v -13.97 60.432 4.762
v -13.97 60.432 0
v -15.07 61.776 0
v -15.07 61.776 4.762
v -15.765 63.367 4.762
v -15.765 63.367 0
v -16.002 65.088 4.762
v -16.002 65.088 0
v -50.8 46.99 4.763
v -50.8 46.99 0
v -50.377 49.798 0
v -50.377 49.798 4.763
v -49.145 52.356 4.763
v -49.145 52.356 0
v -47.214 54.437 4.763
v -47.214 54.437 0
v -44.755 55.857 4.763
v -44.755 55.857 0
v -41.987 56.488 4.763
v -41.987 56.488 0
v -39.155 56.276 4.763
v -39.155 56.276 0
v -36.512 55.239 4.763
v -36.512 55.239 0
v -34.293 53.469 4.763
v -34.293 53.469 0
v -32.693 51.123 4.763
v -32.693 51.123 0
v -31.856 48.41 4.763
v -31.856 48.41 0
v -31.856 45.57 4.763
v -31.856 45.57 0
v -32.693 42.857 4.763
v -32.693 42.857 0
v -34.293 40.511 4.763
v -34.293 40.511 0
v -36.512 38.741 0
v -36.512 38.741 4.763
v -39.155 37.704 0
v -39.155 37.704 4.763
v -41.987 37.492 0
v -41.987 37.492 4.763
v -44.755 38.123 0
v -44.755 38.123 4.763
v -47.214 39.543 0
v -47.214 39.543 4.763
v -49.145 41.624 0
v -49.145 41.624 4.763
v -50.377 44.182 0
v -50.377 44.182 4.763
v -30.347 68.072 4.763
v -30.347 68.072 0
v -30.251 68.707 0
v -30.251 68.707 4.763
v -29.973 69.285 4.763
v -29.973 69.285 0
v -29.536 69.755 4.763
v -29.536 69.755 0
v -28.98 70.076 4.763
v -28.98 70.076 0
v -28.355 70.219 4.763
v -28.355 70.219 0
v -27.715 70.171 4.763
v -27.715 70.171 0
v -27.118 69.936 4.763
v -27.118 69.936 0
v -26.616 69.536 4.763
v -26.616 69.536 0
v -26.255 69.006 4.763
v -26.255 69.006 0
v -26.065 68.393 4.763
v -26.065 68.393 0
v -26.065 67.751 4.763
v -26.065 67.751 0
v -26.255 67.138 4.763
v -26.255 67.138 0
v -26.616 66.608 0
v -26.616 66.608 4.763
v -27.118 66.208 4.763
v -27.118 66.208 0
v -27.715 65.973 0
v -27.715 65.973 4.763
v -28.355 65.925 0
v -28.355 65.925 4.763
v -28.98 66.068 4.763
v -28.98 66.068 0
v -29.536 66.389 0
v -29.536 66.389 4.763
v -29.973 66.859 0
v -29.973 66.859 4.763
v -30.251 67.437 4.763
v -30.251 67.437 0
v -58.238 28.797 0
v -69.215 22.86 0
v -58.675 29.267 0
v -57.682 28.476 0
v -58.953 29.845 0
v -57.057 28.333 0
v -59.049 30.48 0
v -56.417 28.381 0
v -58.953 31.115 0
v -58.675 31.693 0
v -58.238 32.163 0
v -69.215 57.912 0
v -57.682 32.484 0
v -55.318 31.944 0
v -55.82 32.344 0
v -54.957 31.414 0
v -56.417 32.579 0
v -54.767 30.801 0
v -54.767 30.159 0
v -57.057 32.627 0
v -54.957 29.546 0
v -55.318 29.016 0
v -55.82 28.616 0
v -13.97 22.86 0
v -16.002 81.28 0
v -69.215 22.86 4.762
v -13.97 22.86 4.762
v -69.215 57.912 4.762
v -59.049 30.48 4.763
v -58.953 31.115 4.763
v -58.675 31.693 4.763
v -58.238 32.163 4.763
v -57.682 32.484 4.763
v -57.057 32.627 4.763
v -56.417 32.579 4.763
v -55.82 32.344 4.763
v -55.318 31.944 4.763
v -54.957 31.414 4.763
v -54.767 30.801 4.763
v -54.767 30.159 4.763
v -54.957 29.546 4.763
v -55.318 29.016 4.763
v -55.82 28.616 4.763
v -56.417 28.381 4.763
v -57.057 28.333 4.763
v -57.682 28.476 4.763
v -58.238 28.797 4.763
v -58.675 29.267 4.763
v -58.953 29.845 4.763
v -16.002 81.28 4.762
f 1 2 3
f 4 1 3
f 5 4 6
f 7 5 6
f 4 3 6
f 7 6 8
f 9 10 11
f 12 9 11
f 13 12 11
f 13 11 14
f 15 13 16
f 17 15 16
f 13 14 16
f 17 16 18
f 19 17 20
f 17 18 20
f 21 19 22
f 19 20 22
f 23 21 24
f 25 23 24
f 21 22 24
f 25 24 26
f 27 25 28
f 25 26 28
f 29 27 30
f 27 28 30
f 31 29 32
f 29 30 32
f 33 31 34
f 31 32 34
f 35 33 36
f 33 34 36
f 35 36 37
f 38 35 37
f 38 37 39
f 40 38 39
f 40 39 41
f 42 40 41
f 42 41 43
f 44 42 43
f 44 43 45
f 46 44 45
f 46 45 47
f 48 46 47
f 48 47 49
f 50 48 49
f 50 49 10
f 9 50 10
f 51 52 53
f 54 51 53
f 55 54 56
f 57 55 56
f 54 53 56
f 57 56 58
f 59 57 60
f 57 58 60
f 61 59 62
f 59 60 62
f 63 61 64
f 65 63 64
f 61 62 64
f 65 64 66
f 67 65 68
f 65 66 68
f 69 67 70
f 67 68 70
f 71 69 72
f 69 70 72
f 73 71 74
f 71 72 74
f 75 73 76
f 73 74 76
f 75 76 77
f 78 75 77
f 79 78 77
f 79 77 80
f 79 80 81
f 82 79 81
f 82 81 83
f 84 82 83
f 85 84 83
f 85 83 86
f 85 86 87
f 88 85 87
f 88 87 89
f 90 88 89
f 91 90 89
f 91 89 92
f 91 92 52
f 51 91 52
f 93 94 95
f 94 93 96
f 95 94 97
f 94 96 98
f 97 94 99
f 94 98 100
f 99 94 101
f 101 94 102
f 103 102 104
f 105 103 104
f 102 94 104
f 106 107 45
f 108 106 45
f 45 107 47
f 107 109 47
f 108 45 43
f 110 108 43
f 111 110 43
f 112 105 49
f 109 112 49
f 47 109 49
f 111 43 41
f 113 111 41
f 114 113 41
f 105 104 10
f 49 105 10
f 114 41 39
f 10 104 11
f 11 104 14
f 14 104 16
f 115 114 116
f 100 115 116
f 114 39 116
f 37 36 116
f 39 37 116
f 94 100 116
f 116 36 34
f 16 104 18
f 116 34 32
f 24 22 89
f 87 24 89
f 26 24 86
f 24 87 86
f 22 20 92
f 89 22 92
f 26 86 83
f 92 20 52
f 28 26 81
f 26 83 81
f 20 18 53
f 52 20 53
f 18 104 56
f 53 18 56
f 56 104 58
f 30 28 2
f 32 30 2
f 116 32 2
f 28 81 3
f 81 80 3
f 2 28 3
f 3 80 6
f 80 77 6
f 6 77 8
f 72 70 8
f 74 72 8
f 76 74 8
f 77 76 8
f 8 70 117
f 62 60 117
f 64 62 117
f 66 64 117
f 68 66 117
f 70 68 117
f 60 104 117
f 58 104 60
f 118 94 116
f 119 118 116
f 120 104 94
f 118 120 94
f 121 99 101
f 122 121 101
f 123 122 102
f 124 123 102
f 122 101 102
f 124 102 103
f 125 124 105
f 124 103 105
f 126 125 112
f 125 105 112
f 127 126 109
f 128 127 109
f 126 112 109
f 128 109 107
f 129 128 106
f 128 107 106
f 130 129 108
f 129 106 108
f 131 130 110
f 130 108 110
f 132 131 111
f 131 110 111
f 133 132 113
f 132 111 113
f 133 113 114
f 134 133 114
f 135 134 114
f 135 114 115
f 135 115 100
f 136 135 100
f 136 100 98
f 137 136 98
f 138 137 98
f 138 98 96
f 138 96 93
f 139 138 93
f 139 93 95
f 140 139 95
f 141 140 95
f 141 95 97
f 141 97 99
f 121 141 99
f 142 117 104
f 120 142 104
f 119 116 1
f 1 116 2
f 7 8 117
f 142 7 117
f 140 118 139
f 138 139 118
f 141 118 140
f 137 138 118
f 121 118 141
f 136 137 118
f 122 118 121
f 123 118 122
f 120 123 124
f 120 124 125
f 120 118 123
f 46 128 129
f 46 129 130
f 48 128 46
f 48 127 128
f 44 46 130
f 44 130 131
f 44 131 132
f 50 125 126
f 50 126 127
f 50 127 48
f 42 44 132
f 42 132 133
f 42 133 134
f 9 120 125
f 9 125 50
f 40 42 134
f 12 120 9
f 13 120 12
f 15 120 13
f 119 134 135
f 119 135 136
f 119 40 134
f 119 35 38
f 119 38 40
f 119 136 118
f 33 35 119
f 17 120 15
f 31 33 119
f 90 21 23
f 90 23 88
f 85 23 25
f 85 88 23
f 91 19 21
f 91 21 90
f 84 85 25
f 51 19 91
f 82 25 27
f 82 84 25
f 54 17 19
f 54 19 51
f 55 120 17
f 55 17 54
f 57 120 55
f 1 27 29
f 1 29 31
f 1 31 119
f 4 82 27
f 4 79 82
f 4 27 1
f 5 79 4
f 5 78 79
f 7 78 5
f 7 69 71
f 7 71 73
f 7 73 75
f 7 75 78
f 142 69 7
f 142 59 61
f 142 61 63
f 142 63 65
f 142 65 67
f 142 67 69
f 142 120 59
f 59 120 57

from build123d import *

# Parameters (mm, degrees)
BOSS_EXTRUDE1_DEPTH         = 4.7625
F_3_4_0_75_DIAMETER_HOLE1_D = 19.05
F_6_CLEARANCE_HOLE1_D       = 4.3053


with BuildPart() as part:
    # Sketch1 → Boss-Extrude1 (new body)
    with BuildSketch(Plane.XY):
        with BuildLine():
            Line((-13.97, 22.86), (-13.97, 60.431603094))
            ThreePointArc((-13.97, 60.431603094), (-15.471871133, 62.5475), (-16.002, 65.0875))
            Line((-16.002, 65.0875), (-16.002, 81.28))
            Line((-16.002, 81.28), (-69.215, 57.912))
            Line((-69.215, 57.912), (-69.215, 22.86))
            Line((-69.215, 22.86), (-13.97, 22.86))
        make_face()
    extrude(amount=BOSS_EXTRUDE1_DEPTH)

    # 3/4 (0.75) Diameter Hole1 (through all)
    with Locations(Plane.XY.offset(4.7625)):
        with Locations((-41.275, 46.99)):
            Hole(F_3_4_0_75_DIAMETER_HOLE1_D / 2)

    # #6 Clearance Hole1 (through all)
    with Locations(Plane.XY.offset(4.7625)):
        with Locations((-56.896, 30.48), (-28.194, 68.072)):
            Hole(F_6_CLEARANCE_HOLE1_D / 2)


solid = part.part
